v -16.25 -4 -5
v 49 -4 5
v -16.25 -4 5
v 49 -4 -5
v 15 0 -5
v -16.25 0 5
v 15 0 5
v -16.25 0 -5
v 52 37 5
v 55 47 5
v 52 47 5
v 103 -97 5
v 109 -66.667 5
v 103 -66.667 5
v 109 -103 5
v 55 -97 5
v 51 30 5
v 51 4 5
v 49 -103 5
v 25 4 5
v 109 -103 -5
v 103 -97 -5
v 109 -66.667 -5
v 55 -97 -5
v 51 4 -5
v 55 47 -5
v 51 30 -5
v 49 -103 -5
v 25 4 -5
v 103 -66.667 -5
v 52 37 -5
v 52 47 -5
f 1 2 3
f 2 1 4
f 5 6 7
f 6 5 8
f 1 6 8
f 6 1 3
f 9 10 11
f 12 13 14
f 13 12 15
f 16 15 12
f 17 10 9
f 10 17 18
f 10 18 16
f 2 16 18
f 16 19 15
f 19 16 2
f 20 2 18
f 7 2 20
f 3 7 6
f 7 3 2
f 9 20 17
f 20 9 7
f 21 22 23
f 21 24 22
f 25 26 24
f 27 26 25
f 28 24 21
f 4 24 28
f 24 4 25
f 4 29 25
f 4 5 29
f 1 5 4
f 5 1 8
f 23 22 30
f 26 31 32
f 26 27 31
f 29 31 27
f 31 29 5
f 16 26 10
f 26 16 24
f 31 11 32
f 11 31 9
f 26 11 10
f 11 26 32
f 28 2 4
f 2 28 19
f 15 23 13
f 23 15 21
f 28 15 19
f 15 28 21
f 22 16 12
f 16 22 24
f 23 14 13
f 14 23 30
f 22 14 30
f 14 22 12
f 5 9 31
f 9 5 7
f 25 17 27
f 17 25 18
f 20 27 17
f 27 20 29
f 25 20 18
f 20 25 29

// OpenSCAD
// monitor_shelf
// Thing that lets you place small items on the top edge of your
// computer monitor
//
// Rick Rofail
// rick.rofail at gmail.com
// Distributed under GPL version 2
// <http://www.gnu.org/licenses/gpl-2.0.html>
//
// Designed to use customizer at thingiverse
// <http://www.makerbot.com/blog/2013/01/23/openscad-design-tips-how-to-make-a-customizable-thing/>
// INCLUDING LEGOBRICK MODULES FROM 
// building Lego bricks - rdavis.bacs@gmail.com
// measurements taken from: 
//   http://www.robertcailliau.eu/Lego/Dimensions/zMeasurements-en.xhtml
// all copyrights and designs are property of their respective owners.

// K272HL 
//monitor_thickness = 24;
//shelf_depth = 44;
//front_length = 7.5;
//back_length = 20;


// HP LP2465 - 
//monitor_thickness = 49;
//shelf_depth = 65;
//back_length = 17.2;
//front_length = 17.2;

// XG270HU - 
//monitor_thickness = 19.5;
//shelf_depth = 50;
//back_length = 20;
//front_length = 6;


// Generate just a narrow test profile to ensure it fits your monitor
test_profile = 0; // [0: Full width, 1: Test profile]


// Thickness of the plastic in mm
thickness = 3.0;  // thickness

// Thickness of monitor at top edge (mm)
monitor_thickness = 52;

// Depth of the perch shelf (mm).
shelf_depth = 65;

// Thickness of the perch shelf (mm).
shelf_thickness = 4;


// Length of front leg
front_length = 0;

// Length of back leg
back_length = 50;

// Monitor back wedge (degrees: 0 means back is perp. to top edge, >0 means it is slanted)
monitor_back_slope = 0;

// Monitor top wedge (degrees: >0 means that the top slopes way instead of being perpendicular to the screen)
monitor_top_wedge = 0;

// Width of the perch shelf (mm).
shelf_width = 10;

//Size of the shelf lip bead. Default 1.2 for a small lip.
shelf_lip_size = 0;

//Depth of the hook size - mine is 48 mm
hook_depth=48;

//Hieight of the hook - dropping it 40 mm below top 
hook_height=100;

// Radius of bead along joints
bead = shelf_lip_size * thickness;

// epsilon to prevent problems with coincident planes
eps = 0.01;

// LEGO settings
/////////
h_pitch = 8.0;   // horizontal unit
v_pitch = 9.6;   // vertical unit
tol = 0.1;       // "play" in x and y directions
k_dia = 4.8;     // knob diameter
k_height = 1.8;  // knob height
k_n = 40;         // knob resolution
wall = 1.2;      // wall thickness

brick_cyl_ex = 8*sqrt(2)-2*2.4;
brick_cyl_in = 4.8;
beam_cyl = 3.0;

module Perch() // Top level module
{
    rotate([90,0,0]) union() {
        // Front is in the xy plane
//        translate([-bead*0.72,0,bead*0.72]) rotate([90,0,0]) cylinder(h=shelf_width-eps,r=bead,center=true); //front bead
        translate([-(shelf_depth/4.8),0,bead+thickness])rotate([90,0,0]) cylinder(h=shelf_width-eps,r=bead,center=true); //front bead

        translate([-thickness,-shelf_width/2,-front_length+eps]) cube([thickness, shelf_width, front_length]); //front riser
        rotate([0,monitor_top_wedge,0]) {
            union(){
                translate([-shelf_depth/4,-shelf_width/2,0]) cube([shelf_depth+ 2*thickness, shelf_width, shelf_thickness]); //top plane
                 
                translate([monitor_thickness+thickness,-shelf_width/2,thickness]) //back riser
                    rotate([0,180-monitor_back_slope-monitor_top_wedge,0])
                        cube([thickness,shelf_width,back_length]); //back riser
                translate([shelf_depth+thickness-(shelf_depth/4),(shelf_width-eps)/2,bead+thickness])
                    rotate([90,0,0]) cylinder(h=shelf_width-eps,r=bead,center=false);
            }
        }
     translate([55,0,0])rotate([90,180,0]) linear_extrude(height = shelf_width, center = true, convexity = 10, twist = 0)
polygon(points=[[0,0],[40,0],[0,40],[4,4],[30,4],[4,30]], paths=[[0,1,2],[3,4,5]]);   
      //hook section for shower door  
      translate([49,-shelf_width/2,0])rotate([0,0,0]) union() {
          cube([thickness*2, shelf_width, hook_height]); //back riser for hook
          translate([0,0,hook_height-thickness])cube([hook_depth+thickness*2+thickness*2, shelf_width, thickness*2]); //back riser for hook
          translate([hook_depth+thickness+thickness,0,hook_height-hook_height/3])    cube([thickness*2, shelf_width, hook_height/3]); //back riser for hook

      }
    }
}

module Profile()
{
    intersection() {
        Perch();
        cube([1000,1000,2],center=true);
    }
}
// Rotate it so that ends up on the printer bed in the right orientation



if (test_profile == 1) {
    Profile();
} else {
    
    Perch();
}
